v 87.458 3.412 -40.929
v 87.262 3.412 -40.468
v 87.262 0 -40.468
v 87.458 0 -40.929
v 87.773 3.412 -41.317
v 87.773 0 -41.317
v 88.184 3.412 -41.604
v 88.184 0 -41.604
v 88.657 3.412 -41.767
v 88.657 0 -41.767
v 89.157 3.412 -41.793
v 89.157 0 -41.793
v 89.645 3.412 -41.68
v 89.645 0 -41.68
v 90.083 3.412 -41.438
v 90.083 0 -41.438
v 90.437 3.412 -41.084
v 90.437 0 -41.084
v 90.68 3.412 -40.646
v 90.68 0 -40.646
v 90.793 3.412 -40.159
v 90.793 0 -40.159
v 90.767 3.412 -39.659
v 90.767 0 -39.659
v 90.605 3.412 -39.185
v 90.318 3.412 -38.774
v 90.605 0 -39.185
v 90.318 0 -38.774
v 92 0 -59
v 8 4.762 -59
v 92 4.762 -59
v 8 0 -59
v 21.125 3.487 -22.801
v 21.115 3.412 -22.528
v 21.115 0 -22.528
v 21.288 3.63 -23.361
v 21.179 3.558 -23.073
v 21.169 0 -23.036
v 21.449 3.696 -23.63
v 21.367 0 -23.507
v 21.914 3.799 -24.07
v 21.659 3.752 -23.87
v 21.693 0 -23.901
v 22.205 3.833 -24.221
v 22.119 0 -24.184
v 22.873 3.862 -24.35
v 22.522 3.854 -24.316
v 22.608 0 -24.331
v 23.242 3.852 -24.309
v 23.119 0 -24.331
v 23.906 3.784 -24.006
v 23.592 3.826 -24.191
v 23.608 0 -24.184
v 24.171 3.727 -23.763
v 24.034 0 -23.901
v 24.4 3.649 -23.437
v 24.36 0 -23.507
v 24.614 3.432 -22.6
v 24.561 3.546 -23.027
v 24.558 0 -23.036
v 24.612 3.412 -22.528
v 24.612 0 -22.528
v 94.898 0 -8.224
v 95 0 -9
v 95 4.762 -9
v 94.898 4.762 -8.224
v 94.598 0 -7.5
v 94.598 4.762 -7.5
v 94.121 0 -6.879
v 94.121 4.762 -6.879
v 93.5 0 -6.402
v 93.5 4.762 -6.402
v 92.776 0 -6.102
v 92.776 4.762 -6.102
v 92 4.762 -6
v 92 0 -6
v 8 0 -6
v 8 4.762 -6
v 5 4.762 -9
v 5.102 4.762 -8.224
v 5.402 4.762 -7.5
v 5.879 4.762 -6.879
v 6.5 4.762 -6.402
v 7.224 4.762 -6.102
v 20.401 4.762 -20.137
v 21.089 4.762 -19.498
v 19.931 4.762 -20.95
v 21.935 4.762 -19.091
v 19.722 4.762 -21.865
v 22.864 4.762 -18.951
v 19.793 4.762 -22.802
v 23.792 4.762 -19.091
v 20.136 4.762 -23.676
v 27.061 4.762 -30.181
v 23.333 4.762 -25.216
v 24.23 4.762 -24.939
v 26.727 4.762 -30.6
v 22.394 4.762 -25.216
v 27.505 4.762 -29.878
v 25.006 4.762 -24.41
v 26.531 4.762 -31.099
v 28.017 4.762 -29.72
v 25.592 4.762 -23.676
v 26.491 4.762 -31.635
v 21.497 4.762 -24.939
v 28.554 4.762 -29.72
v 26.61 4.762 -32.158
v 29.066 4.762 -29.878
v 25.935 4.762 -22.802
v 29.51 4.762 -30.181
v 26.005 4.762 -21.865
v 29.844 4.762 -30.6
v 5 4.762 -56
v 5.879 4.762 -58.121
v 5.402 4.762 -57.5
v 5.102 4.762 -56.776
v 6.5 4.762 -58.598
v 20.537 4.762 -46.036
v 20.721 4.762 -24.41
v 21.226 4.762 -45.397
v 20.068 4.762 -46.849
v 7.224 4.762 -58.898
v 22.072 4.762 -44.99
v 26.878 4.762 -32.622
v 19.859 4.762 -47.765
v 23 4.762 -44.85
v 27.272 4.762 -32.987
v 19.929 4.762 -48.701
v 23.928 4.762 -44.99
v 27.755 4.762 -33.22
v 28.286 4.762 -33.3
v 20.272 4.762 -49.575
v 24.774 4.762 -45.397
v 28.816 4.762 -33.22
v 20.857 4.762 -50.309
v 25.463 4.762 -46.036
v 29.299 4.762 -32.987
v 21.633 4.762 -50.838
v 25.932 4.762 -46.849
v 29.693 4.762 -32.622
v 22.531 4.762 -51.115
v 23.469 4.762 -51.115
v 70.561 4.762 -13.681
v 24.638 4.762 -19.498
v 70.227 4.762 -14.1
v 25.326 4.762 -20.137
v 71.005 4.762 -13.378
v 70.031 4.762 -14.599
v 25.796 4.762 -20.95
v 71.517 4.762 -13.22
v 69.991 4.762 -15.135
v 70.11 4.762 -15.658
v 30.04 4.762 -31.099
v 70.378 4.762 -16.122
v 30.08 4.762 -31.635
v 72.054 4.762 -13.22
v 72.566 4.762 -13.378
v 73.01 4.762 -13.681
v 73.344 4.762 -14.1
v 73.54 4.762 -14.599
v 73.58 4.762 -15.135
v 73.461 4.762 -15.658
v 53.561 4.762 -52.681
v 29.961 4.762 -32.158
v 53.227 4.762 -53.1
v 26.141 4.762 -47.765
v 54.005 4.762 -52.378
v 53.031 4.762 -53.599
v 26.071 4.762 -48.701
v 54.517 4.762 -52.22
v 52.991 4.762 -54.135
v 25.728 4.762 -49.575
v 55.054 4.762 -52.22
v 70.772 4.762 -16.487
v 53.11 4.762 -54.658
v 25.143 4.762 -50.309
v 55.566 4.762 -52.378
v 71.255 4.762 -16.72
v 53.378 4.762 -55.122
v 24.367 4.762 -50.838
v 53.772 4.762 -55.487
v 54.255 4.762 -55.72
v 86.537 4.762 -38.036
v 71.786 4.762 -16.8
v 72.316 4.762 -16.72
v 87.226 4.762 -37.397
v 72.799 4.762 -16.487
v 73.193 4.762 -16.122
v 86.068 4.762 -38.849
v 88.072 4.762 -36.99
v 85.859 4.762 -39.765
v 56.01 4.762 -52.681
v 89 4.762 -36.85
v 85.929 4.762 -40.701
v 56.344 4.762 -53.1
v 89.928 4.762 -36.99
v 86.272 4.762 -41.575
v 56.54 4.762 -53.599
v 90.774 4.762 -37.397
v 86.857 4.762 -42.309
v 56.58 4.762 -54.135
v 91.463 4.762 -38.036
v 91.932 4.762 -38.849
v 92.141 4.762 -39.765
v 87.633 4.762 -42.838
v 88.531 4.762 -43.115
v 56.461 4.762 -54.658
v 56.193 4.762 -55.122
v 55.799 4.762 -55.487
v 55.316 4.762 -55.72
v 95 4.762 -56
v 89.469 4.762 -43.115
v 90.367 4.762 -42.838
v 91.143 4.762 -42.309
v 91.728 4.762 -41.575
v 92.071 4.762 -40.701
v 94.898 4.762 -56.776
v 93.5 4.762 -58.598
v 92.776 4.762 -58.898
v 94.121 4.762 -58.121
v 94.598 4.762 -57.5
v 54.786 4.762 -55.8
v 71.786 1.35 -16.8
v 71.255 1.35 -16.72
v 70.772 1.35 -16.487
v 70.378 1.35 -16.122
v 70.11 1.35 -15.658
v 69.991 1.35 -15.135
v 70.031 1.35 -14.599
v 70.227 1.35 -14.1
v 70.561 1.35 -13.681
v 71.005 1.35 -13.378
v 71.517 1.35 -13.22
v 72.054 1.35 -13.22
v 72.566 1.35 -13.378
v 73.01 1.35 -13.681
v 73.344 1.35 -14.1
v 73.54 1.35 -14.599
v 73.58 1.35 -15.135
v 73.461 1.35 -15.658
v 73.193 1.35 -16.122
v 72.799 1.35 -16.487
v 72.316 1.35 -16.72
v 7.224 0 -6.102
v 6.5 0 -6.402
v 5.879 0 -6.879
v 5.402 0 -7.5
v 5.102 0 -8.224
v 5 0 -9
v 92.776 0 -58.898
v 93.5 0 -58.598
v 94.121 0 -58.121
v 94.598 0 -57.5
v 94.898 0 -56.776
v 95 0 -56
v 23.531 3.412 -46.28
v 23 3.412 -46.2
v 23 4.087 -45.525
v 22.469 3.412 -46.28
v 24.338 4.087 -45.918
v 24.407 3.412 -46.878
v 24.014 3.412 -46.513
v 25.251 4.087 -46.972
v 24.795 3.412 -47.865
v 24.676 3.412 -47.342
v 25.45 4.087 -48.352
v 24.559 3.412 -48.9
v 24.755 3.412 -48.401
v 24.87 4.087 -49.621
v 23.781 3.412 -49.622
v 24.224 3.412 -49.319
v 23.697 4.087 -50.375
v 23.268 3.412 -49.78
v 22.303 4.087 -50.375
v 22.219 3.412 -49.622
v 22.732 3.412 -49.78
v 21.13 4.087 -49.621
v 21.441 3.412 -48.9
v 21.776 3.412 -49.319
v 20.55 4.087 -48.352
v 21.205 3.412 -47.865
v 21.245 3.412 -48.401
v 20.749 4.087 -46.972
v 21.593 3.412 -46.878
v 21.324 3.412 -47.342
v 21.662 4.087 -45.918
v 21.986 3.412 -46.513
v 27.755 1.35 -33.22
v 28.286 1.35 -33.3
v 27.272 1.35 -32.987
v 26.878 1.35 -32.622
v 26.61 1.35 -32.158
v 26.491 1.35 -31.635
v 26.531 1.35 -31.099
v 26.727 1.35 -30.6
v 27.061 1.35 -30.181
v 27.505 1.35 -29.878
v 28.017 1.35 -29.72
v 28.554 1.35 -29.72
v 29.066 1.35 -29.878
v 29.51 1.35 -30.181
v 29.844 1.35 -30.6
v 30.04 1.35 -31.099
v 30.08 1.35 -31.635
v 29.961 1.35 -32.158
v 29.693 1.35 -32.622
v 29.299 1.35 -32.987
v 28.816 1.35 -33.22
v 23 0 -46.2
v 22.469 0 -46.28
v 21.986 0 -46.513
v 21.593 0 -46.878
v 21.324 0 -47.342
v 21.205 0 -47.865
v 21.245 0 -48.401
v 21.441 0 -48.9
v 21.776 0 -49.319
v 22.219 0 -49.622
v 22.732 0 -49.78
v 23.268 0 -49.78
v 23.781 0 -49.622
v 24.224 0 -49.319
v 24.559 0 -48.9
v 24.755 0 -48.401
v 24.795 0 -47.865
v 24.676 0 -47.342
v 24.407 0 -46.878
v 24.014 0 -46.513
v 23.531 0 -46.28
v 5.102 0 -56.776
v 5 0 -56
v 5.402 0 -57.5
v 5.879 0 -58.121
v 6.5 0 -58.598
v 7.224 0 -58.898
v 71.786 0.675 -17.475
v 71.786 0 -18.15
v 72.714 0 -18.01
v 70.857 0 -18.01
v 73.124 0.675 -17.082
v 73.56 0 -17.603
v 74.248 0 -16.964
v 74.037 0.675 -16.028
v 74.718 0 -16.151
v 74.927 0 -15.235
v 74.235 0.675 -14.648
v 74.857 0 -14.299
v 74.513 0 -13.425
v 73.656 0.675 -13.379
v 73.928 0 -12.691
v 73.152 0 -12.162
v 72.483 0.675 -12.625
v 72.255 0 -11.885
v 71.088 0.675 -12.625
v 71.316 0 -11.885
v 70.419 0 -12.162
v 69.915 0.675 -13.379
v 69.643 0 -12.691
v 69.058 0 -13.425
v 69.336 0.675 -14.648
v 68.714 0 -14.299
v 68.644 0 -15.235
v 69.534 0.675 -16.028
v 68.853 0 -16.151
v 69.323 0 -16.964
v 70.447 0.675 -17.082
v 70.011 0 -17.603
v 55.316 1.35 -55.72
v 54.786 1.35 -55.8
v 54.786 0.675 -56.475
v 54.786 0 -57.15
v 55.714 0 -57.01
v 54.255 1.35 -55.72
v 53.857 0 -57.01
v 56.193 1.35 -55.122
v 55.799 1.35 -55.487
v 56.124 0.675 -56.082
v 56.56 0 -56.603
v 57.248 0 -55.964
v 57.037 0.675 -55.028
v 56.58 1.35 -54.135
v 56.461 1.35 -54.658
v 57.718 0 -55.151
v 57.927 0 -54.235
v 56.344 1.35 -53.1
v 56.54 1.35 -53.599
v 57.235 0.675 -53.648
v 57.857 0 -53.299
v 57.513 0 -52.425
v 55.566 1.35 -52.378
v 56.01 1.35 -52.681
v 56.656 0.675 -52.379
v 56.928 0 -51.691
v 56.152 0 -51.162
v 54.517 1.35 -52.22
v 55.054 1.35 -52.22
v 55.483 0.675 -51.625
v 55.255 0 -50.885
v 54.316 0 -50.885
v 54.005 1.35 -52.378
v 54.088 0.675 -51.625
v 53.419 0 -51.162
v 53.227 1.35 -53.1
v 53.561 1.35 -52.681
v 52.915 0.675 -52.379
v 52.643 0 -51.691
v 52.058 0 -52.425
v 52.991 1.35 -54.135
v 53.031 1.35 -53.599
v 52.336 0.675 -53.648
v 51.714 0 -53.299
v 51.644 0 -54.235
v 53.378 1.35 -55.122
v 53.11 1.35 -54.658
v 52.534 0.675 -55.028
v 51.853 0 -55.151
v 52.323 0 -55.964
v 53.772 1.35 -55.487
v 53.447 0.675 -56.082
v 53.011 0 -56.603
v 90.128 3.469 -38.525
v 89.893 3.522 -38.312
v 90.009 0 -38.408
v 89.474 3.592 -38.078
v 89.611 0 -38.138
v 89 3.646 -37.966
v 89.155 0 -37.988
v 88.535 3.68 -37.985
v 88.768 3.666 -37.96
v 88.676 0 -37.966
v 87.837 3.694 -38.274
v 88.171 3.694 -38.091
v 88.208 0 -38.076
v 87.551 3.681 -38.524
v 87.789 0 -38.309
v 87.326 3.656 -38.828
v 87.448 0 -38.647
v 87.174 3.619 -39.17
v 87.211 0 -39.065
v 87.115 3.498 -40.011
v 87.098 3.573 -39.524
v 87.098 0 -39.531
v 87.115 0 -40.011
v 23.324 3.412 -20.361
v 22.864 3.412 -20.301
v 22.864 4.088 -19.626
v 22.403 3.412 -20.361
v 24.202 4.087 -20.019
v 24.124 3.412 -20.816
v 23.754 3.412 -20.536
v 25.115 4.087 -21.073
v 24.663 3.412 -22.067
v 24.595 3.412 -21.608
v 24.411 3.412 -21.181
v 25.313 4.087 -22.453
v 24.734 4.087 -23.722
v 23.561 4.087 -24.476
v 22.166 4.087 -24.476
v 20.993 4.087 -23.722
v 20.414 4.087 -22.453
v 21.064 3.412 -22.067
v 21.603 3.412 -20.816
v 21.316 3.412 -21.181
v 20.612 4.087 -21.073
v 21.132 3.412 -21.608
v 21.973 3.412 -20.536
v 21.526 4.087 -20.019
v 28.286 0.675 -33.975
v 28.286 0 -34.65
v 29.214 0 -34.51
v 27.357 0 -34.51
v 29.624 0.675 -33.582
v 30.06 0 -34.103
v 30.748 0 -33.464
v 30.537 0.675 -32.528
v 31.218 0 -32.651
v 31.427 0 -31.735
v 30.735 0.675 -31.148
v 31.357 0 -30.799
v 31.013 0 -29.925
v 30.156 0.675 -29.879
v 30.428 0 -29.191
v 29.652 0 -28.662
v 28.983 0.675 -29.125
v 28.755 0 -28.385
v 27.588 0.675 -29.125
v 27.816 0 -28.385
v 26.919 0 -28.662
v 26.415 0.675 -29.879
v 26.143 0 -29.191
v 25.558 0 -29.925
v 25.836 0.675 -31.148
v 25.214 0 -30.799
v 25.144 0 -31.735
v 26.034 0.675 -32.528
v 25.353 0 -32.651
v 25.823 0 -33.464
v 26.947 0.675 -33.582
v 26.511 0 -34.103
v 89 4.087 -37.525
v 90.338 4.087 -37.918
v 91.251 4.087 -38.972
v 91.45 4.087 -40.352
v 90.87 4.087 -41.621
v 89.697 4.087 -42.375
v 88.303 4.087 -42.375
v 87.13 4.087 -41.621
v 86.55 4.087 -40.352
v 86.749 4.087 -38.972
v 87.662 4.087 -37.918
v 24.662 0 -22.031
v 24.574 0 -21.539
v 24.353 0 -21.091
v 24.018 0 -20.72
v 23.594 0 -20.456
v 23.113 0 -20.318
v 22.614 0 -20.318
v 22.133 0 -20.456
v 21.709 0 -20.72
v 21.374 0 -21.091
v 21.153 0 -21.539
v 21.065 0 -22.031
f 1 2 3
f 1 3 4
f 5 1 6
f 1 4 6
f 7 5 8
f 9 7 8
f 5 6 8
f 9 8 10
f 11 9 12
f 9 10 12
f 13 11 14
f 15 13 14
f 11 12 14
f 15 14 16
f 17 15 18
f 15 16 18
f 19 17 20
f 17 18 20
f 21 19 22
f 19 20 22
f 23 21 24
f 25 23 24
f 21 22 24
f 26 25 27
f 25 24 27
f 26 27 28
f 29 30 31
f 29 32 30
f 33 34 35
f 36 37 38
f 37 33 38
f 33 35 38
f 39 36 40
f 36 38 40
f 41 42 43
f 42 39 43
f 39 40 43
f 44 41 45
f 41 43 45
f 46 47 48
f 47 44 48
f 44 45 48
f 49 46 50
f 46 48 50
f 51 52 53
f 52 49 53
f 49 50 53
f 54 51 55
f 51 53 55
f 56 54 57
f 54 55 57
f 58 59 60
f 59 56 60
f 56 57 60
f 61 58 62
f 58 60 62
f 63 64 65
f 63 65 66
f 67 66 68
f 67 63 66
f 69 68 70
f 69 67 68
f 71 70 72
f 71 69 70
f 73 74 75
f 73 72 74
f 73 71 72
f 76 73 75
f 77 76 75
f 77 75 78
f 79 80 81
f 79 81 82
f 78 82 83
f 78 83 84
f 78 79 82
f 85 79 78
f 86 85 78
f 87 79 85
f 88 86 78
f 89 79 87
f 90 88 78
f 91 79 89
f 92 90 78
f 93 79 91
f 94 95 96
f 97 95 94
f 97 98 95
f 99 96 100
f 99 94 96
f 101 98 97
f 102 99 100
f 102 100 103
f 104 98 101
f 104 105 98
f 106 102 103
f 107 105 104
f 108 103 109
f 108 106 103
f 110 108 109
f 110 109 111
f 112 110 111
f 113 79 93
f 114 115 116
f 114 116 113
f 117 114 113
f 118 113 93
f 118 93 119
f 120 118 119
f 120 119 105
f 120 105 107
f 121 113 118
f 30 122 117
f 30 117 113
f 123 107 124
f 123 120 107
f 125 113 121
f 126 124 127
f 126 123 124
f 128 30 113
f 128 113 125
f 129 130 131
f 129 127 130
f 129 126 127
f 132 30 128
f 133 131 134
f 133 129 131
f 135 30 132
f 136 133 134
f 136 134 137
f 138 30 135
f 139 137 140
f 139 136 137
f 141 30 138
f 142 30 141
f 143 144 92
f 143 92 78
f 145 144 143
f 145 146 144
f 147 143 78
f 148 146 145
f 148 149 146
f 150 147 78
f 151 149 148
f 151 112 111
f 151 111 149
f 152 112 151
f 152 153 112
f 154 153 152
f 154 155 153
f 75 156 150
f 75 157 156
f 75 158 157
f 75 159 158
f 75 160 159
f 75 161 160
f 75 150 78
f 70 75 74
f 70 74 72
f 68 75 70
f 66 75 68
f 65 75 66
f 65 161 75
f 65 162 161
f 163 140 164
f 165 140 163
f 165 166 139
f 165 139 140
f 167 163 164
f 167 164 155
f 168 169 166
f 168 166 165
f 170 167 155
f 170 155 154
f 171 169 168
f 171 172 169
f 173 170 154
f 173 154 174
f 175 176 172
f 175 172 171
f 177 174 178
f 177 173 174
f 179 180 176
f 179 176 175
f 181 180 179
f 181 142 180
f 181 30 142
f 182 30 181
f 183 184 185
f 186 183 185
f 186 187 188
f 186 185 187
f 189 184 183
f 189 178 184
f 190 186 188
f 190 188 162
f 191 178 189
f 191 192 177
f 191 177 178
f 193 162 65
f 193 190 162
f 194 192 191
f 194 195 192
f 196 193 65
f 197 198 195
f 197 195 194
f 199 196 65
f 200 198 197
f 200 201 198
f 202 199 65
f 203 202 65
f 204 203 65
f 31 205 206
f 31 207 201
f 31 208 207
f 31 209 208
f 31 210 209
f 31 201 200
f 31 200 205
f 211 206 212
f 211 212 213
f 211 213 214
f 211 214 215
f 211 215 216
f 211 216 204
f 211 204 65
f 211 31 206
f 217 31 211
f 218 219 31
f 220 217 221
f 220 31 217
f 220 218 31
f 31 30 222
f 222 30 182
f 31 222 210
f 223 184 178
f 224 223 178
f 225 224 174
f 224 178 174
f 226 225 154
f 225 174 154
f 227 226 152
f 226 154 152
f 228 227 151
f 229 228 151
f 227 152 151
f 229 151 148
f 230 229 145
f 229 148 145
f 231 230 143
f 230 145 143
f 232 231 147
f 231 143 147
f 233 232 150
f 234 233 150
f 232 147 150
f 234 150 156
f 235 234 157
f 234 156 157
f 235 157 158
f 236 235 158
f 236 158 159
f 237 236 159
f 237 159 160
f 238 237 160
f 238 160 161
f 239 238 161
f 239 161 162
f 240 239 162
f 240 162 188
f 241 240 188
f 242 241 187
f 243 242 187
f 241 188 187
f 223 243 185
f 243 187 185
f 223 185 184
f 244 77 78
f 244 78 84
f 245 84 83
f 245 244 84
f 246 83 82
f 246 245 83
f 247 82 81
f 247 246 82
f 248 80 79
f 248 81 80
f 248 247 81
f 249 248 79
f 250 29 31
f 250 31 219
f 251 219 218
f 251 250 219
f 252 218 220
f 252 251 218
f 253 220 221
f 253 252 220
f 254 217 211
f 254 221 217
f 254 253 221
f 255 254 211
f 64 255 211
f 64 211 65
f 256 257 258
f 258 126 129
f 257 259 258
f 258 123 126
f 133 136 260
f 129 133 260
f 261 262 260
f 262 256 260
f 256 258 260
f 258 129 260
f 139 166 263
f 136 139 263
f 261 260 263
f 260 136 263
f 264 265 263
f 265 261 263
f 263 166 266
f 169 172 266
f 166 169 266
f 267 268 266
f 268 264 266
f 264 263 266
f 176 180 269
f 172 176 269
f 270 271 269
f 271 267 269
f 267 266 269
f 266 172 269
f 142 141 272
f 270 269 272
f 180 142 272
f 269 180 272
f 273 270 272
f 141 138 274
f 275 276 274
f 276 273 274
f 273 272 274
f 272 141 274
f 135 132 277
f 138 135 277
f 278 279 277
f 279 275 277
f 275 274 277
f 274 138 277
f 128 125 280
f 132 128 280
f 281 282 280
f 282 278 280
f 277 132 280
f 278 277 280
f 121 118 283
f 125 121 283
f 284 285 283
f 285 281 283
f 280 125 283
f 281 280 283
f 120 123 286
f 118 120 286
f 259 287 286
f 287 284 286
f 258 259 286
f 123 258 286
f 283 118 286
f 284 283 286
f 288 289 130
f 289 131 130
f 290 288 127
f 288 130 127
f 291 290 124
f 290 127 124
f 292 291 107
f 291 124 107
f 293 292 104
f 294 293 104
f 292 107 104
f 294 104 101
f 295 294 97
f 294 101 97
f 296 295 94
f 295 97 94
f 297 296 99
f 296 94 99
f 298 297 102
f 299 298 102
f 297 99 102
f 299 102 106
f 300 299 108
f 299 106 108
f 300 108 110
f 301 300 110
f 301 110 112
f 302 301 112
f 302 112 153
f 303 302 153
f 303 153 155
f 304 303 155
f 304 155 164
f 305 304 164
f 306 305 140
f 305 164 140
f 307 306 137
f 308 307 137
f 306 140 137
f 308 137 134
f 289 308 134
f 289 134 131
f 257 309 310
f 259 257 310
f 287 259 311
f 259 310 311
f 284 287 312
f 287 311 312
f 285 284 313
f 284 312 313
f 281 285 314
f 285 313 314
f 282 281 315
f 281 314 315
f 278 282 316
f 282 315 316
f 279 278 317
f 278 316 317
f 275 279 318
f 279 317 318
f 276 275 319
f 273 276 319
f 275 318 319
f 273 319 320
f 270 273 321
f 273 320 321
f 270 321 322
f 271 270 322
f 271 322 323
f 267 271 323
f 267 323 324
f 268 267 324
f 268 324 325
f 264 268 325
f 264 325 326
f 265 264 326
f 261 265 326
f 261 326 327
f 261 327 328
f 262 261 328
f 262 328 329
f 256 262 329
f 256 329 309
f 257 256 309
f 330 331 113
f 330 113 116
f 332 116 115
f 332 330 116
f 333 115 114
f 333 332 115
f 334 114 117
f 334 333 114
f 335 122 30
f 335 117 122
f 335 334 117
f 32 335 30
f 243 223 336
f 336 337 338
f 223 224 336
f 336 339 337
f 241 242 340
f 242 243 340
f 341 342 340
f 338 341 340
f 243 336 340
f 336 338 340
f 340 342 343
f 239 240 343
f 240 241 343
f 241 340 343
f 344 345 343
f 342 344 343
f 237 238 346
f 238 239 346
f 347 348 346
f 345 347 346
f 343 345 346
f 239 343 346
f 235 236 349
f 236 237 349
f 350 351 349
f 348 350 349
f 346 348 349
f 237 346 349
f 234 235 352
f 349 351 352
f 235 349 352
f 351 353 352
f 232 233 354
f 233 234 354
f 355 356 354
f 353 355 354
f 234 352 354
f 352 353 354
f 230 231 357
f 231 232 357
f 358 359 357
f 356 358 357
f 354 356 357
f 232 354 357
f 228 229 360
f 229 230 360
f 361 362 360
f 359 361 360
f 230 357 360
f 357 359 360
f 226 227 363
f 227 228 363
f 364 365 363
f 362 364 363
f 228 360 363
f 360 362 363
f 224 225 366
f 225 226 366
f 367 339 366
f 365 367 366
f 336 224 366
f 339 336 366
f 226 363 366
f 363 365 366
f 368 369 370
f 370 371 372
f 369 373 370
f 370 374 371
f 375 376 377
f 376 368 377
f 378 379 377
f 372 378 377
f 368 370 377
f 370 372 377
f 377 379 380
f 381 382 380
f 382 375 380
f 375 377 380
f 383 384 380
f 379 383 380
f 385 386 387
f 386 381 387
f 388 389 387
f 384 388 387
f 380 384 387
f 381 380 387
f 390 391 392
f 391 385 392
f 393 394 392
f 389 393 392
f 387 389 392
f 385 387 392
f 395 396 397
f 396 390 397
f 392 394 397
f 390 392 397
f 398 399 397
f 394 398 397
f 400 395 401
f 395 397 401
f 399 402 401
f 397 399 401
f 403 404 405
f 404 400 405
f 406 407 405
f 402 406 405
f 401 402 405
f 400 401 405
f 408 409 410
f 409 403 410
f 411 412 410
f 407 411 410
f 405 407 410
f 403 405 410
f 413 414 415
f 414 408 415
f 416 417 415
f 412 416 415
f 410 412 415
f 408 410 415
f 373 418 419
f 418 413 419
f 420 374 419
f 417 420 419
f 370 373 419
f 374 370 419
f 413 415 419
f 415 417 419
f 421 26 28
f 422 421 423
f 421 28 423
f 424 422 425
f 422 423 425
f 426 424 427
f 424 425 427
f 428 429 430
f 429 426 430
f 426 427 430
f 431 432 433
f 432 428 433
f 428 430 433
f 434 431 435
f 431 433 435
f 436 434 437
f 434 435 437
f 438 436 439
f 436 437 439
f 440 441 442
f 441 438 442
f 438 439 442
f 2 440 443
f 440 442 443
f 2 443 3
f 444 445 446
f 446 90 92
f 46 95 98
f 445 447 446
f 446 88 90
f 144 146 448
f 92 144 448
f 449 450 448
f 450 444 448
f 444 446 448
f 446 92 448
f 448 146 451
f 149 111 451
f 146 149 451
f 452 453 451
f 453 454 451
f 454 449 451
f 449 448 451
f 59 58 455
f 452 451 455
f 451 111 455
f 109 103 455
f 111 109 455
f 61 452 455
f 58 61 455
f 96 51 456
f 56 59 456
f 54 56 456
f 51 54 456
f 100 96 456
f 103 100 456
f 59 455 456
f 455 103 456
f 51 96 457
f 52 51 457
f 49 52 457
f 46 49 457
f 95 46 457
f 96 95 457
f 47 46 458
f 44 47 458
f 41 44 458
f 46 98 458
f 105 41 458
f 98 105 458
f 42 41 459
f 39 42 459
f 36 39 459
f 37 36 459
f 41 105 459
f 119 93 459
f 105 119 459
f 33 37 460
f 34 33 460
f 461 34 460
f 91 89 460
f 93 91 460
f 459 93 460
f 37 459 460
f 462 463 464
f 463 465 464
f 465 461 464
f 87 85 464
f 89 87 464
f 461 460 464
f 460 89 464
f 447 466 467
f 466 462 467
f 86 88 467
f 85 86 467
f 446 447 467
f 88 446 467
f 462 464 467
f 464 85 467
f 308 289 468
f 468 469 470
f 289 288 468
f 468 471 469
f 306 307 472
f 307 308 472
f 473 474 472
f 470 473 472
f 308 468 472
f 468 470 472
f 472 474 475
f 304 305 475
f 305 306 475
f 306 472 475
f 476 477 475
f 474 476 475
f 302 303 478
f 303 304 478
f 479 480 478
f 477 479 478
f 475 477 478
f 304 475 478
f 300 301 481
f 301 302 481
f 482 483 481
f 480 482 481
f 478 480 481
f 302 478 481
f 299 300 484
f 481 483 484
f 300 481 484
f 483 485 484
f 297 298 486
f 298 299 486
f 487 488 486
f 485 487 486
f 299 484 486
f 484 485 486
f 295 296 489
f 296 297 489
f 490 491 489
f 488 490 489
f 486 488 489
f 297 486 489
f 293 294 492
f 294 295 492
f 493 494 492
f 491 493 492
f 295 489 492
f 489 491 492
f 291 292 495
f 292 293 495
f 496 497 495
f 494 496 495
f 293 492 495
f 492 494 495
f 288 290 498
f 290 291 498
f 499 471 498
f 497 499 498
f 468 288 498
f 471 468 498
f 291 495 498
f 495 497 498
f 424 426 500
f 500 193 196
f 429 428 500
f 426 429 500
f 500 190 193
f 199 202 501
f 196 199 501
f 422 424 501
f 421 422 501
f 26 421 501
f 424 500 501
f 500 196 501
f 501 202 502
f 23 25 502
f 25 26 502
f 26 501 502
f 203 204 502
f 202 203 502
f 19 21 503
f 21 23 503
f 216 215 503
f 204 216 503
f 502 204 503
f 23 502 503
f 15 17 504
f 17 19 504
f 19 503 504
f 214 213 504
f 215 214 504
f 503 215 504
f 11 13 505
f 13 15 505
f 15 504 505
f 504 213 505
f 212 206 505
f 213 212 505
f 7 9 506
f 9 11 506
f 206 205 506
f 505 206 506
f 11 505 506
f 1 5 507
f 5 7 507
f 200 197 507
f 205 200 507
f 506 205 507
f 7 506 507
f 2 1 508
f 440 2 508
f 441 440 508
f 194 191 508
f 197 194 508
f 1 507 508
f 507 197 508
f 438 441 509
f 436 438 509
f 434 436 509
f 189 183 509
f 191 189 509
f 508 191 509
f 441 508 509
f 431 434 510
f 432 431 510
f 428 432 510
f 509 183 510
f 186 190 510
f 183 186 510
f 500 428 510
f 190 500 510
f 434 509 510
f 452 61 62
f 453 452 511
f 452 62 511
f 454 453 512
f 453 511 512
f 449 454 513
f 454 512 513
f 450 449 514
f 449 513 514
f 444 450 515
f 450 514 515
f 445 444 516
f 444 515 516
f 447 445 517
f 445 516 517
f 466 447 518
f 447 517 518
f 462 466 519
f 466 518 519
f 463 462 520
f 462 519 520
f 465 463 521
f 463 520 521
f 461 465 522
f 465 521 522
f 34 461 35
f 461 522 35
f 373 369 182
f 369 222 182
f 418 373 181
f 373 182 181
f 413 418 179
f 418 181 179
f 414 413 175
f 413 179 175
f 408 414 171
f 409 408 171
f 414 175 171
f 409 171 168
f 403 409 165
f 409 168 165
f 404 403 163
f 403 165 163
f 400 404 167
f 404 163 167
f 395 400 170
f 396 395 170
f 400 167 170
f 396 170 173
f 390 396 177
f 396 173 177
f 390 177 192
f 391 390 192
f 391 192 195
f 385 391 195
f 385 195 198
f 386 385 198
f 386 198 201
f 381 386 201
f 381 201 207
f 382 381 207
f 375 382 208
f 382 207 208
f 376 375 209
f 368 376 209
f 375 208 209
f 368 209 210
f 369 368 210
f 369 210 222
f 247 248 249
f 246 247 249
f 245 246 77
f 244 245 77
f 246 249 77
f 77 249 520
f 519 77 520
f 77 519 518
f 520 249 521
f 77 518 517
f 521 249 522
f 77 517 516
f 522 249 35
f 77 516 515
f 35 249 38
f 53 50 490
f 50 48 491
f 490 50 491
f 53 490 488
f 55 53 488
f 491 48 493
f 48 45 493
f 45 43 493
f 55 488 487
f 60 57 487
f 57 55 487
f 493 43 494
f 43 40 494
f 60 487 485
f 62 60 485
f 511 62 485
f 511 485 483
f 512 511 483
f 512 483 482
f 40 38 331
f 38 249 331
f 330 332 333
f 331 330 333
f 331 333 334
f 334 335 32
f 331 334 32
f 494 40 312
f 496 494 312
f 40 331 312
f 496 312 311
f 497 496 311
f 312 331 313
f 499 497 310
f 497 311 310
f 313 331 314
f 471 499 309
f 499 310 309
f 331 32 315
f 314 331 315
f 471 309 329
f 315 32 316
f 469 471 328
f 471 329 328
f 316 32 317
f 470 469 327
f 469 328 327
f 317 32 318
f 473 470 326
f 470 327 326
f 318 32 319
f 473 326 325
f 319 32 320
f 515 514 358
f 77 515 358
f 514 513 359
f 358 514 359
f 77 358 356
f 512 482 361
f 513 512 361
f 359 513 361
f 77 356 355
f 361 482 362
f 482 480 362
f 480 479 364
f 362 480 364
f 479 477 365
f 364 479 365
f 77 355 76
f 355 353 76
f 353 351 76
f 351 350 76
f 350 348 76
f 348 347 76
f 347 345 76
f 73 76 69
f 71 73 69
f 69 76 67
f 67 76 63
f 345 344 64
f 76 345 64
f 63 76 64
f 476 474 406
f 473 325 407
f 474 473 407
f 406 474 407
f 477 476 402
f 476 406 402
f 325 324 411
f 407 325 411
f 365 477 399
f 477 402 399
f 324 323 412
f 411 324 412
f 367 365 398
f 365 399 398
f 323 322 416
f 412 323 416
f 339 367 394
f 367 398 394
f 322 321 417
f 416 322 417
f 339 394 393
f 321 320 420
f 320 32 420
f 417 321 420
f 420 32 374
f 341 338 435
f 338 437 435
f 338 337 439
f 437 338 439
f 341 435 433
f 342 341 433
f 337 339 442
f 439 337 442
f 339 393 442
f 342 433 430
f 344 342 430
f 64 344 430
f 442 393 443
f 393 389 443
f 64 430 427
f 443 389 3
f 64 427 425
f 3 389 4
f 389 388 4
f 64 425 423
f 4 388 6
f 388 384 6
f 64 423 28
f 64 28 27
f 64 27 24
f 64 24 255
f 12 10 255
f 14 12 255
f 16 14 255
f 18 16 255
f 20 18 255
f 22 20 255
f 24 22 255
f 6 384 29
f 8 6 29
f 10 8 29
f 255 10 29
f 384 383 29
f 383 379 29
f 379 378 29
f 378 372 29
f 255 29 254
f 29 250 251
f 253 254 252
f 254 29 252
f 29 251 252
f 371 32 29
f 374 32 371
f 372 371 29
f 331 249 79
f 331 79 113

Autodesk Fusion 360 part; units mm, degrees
sketch "Sketch1" plane through (0, 0, 0) normal (0, 1, 0) x (1, 0, 0)
  line L0 (8, 59) -> (92, 59)
  line L1 (95, 56) -> (95, 9)
  line L2 (92, 6) -> (8, 6)
  line L3 (5, 9) -> (5, 56)
  arc A0 (8, 59) -> (5, 56) centre (8, 56) ccw
  arc A1 (95, 56) -> (92, 59) centre (92, 56) ccw
  arc A2 (5, 9) -> (8, 6) centre (8, 9) ccw
  arc A3 (92, 6) -> (95, 9) centre (92, 9) ccw
  circle A4 centre (23, 48) radius 1.75
  circle A5 centre (22.8636, 22.6) radius 1.75
  circle A6 centre (88.8386, 39.7087) radius 1.75
  line L4 (81.7855, 13) -> (25.7855, 13) construction
  line L5 (25.7855, 13) -> (25.7855, 57) construction
  line L6 (25.7855, 57) -> (81.7855, 57) construction
  line L7 (81.7855, 57) -> (81.7855, 13) construction
  line L8 (81.7855, 13) -> (25.7855, 57) construction
  line L9 (25.7855, 13) -> (81.7855, 57) construction
  circle A7 centre (54.7855, 54) radius 1.75
  circle A8 centre (28.2855, 31.5) radius 1.75
  circle A9 centre (71.7855, 15) radius 1.75
  line L10 (23, 48) -> (22.8636, 22.6) construction
  line L11 (88.8386, 39.7087) -> (22.9574, 40.0625) construction
  point P0 (5, 59)
  point P1 (95, 59)
  point P2 (5, 6)
  point P3 (53.7855, 35)
  dimension "d1" = 90
  dimension "d2" = 53
  dimension "d3" = 3
  dimension "d4" = 3
  dimension "d5" = 3
  dimension "d6" = 3
  dimension "d11" = 3.5
  dimension "d12" = 18
  dimension "d13" = 11
  dimension "d14" = 3.5
  dimension "d15" = 3.5
  dimension "d55" = 56
  dimension "d56" = 44
  dimension "d57" = 3.5
  dimension "d58" = 29
  dimension "d59" = 3
  dimension "d60" = 3.5
  dimension "d61" = 18.5
  dimension "d62" = 2.5
  dimension "d63" = 3.5
  dimension "d64" = 10
  dimension "d65" = 2
  dimension "d66" = 2
  dimension "d99" = 25.4
  dimension "d102" = 7.9375
  dimension "d103" = 65.8813
extrude "Extrude2" add sketch "Sketch1" along normal blind 4.7625
hole "Hole4" at (22.8636, 4.7625, -22.1008) direction (0, -1, 0) diameter 3.6 depth 26.4 tip angle 118 countersink diameter 6.3 countersink angle 90
hole "Hole5" at (23, 4.7625, -48) direction (0, -1, 0) diameter 3.6 depth 26.4 tip angle 118 countersink diameter 6.3 countersink angle 90
hole "Hole6" at (89, 4.7625, -40) direction (0, -1, 0) diameter 3.6 depth 26.4 tip angle 118 countersink diameter 6.3 countersink angle 90
hole "Hole7" at (54.7855, 0, -54) direction (0, 1, 0) diameter 3.6 depth 26.4 tip angle 118 countersink diameter 6.3 countersink angle 90
hole "Hole8" at (28.2855, 0, -31.5) direction (0, 1, 0) diameter 3.6 depth 26.4 tip angle 118 countersink diameter 6.3 countersink angle 90
hole "Hole9" at (71.7855, 0, -15) direction (0, 1, 0) diameter 3.6 depth 26.4 tip angle 118 countersink diameter 6.3 countersink angle 90
